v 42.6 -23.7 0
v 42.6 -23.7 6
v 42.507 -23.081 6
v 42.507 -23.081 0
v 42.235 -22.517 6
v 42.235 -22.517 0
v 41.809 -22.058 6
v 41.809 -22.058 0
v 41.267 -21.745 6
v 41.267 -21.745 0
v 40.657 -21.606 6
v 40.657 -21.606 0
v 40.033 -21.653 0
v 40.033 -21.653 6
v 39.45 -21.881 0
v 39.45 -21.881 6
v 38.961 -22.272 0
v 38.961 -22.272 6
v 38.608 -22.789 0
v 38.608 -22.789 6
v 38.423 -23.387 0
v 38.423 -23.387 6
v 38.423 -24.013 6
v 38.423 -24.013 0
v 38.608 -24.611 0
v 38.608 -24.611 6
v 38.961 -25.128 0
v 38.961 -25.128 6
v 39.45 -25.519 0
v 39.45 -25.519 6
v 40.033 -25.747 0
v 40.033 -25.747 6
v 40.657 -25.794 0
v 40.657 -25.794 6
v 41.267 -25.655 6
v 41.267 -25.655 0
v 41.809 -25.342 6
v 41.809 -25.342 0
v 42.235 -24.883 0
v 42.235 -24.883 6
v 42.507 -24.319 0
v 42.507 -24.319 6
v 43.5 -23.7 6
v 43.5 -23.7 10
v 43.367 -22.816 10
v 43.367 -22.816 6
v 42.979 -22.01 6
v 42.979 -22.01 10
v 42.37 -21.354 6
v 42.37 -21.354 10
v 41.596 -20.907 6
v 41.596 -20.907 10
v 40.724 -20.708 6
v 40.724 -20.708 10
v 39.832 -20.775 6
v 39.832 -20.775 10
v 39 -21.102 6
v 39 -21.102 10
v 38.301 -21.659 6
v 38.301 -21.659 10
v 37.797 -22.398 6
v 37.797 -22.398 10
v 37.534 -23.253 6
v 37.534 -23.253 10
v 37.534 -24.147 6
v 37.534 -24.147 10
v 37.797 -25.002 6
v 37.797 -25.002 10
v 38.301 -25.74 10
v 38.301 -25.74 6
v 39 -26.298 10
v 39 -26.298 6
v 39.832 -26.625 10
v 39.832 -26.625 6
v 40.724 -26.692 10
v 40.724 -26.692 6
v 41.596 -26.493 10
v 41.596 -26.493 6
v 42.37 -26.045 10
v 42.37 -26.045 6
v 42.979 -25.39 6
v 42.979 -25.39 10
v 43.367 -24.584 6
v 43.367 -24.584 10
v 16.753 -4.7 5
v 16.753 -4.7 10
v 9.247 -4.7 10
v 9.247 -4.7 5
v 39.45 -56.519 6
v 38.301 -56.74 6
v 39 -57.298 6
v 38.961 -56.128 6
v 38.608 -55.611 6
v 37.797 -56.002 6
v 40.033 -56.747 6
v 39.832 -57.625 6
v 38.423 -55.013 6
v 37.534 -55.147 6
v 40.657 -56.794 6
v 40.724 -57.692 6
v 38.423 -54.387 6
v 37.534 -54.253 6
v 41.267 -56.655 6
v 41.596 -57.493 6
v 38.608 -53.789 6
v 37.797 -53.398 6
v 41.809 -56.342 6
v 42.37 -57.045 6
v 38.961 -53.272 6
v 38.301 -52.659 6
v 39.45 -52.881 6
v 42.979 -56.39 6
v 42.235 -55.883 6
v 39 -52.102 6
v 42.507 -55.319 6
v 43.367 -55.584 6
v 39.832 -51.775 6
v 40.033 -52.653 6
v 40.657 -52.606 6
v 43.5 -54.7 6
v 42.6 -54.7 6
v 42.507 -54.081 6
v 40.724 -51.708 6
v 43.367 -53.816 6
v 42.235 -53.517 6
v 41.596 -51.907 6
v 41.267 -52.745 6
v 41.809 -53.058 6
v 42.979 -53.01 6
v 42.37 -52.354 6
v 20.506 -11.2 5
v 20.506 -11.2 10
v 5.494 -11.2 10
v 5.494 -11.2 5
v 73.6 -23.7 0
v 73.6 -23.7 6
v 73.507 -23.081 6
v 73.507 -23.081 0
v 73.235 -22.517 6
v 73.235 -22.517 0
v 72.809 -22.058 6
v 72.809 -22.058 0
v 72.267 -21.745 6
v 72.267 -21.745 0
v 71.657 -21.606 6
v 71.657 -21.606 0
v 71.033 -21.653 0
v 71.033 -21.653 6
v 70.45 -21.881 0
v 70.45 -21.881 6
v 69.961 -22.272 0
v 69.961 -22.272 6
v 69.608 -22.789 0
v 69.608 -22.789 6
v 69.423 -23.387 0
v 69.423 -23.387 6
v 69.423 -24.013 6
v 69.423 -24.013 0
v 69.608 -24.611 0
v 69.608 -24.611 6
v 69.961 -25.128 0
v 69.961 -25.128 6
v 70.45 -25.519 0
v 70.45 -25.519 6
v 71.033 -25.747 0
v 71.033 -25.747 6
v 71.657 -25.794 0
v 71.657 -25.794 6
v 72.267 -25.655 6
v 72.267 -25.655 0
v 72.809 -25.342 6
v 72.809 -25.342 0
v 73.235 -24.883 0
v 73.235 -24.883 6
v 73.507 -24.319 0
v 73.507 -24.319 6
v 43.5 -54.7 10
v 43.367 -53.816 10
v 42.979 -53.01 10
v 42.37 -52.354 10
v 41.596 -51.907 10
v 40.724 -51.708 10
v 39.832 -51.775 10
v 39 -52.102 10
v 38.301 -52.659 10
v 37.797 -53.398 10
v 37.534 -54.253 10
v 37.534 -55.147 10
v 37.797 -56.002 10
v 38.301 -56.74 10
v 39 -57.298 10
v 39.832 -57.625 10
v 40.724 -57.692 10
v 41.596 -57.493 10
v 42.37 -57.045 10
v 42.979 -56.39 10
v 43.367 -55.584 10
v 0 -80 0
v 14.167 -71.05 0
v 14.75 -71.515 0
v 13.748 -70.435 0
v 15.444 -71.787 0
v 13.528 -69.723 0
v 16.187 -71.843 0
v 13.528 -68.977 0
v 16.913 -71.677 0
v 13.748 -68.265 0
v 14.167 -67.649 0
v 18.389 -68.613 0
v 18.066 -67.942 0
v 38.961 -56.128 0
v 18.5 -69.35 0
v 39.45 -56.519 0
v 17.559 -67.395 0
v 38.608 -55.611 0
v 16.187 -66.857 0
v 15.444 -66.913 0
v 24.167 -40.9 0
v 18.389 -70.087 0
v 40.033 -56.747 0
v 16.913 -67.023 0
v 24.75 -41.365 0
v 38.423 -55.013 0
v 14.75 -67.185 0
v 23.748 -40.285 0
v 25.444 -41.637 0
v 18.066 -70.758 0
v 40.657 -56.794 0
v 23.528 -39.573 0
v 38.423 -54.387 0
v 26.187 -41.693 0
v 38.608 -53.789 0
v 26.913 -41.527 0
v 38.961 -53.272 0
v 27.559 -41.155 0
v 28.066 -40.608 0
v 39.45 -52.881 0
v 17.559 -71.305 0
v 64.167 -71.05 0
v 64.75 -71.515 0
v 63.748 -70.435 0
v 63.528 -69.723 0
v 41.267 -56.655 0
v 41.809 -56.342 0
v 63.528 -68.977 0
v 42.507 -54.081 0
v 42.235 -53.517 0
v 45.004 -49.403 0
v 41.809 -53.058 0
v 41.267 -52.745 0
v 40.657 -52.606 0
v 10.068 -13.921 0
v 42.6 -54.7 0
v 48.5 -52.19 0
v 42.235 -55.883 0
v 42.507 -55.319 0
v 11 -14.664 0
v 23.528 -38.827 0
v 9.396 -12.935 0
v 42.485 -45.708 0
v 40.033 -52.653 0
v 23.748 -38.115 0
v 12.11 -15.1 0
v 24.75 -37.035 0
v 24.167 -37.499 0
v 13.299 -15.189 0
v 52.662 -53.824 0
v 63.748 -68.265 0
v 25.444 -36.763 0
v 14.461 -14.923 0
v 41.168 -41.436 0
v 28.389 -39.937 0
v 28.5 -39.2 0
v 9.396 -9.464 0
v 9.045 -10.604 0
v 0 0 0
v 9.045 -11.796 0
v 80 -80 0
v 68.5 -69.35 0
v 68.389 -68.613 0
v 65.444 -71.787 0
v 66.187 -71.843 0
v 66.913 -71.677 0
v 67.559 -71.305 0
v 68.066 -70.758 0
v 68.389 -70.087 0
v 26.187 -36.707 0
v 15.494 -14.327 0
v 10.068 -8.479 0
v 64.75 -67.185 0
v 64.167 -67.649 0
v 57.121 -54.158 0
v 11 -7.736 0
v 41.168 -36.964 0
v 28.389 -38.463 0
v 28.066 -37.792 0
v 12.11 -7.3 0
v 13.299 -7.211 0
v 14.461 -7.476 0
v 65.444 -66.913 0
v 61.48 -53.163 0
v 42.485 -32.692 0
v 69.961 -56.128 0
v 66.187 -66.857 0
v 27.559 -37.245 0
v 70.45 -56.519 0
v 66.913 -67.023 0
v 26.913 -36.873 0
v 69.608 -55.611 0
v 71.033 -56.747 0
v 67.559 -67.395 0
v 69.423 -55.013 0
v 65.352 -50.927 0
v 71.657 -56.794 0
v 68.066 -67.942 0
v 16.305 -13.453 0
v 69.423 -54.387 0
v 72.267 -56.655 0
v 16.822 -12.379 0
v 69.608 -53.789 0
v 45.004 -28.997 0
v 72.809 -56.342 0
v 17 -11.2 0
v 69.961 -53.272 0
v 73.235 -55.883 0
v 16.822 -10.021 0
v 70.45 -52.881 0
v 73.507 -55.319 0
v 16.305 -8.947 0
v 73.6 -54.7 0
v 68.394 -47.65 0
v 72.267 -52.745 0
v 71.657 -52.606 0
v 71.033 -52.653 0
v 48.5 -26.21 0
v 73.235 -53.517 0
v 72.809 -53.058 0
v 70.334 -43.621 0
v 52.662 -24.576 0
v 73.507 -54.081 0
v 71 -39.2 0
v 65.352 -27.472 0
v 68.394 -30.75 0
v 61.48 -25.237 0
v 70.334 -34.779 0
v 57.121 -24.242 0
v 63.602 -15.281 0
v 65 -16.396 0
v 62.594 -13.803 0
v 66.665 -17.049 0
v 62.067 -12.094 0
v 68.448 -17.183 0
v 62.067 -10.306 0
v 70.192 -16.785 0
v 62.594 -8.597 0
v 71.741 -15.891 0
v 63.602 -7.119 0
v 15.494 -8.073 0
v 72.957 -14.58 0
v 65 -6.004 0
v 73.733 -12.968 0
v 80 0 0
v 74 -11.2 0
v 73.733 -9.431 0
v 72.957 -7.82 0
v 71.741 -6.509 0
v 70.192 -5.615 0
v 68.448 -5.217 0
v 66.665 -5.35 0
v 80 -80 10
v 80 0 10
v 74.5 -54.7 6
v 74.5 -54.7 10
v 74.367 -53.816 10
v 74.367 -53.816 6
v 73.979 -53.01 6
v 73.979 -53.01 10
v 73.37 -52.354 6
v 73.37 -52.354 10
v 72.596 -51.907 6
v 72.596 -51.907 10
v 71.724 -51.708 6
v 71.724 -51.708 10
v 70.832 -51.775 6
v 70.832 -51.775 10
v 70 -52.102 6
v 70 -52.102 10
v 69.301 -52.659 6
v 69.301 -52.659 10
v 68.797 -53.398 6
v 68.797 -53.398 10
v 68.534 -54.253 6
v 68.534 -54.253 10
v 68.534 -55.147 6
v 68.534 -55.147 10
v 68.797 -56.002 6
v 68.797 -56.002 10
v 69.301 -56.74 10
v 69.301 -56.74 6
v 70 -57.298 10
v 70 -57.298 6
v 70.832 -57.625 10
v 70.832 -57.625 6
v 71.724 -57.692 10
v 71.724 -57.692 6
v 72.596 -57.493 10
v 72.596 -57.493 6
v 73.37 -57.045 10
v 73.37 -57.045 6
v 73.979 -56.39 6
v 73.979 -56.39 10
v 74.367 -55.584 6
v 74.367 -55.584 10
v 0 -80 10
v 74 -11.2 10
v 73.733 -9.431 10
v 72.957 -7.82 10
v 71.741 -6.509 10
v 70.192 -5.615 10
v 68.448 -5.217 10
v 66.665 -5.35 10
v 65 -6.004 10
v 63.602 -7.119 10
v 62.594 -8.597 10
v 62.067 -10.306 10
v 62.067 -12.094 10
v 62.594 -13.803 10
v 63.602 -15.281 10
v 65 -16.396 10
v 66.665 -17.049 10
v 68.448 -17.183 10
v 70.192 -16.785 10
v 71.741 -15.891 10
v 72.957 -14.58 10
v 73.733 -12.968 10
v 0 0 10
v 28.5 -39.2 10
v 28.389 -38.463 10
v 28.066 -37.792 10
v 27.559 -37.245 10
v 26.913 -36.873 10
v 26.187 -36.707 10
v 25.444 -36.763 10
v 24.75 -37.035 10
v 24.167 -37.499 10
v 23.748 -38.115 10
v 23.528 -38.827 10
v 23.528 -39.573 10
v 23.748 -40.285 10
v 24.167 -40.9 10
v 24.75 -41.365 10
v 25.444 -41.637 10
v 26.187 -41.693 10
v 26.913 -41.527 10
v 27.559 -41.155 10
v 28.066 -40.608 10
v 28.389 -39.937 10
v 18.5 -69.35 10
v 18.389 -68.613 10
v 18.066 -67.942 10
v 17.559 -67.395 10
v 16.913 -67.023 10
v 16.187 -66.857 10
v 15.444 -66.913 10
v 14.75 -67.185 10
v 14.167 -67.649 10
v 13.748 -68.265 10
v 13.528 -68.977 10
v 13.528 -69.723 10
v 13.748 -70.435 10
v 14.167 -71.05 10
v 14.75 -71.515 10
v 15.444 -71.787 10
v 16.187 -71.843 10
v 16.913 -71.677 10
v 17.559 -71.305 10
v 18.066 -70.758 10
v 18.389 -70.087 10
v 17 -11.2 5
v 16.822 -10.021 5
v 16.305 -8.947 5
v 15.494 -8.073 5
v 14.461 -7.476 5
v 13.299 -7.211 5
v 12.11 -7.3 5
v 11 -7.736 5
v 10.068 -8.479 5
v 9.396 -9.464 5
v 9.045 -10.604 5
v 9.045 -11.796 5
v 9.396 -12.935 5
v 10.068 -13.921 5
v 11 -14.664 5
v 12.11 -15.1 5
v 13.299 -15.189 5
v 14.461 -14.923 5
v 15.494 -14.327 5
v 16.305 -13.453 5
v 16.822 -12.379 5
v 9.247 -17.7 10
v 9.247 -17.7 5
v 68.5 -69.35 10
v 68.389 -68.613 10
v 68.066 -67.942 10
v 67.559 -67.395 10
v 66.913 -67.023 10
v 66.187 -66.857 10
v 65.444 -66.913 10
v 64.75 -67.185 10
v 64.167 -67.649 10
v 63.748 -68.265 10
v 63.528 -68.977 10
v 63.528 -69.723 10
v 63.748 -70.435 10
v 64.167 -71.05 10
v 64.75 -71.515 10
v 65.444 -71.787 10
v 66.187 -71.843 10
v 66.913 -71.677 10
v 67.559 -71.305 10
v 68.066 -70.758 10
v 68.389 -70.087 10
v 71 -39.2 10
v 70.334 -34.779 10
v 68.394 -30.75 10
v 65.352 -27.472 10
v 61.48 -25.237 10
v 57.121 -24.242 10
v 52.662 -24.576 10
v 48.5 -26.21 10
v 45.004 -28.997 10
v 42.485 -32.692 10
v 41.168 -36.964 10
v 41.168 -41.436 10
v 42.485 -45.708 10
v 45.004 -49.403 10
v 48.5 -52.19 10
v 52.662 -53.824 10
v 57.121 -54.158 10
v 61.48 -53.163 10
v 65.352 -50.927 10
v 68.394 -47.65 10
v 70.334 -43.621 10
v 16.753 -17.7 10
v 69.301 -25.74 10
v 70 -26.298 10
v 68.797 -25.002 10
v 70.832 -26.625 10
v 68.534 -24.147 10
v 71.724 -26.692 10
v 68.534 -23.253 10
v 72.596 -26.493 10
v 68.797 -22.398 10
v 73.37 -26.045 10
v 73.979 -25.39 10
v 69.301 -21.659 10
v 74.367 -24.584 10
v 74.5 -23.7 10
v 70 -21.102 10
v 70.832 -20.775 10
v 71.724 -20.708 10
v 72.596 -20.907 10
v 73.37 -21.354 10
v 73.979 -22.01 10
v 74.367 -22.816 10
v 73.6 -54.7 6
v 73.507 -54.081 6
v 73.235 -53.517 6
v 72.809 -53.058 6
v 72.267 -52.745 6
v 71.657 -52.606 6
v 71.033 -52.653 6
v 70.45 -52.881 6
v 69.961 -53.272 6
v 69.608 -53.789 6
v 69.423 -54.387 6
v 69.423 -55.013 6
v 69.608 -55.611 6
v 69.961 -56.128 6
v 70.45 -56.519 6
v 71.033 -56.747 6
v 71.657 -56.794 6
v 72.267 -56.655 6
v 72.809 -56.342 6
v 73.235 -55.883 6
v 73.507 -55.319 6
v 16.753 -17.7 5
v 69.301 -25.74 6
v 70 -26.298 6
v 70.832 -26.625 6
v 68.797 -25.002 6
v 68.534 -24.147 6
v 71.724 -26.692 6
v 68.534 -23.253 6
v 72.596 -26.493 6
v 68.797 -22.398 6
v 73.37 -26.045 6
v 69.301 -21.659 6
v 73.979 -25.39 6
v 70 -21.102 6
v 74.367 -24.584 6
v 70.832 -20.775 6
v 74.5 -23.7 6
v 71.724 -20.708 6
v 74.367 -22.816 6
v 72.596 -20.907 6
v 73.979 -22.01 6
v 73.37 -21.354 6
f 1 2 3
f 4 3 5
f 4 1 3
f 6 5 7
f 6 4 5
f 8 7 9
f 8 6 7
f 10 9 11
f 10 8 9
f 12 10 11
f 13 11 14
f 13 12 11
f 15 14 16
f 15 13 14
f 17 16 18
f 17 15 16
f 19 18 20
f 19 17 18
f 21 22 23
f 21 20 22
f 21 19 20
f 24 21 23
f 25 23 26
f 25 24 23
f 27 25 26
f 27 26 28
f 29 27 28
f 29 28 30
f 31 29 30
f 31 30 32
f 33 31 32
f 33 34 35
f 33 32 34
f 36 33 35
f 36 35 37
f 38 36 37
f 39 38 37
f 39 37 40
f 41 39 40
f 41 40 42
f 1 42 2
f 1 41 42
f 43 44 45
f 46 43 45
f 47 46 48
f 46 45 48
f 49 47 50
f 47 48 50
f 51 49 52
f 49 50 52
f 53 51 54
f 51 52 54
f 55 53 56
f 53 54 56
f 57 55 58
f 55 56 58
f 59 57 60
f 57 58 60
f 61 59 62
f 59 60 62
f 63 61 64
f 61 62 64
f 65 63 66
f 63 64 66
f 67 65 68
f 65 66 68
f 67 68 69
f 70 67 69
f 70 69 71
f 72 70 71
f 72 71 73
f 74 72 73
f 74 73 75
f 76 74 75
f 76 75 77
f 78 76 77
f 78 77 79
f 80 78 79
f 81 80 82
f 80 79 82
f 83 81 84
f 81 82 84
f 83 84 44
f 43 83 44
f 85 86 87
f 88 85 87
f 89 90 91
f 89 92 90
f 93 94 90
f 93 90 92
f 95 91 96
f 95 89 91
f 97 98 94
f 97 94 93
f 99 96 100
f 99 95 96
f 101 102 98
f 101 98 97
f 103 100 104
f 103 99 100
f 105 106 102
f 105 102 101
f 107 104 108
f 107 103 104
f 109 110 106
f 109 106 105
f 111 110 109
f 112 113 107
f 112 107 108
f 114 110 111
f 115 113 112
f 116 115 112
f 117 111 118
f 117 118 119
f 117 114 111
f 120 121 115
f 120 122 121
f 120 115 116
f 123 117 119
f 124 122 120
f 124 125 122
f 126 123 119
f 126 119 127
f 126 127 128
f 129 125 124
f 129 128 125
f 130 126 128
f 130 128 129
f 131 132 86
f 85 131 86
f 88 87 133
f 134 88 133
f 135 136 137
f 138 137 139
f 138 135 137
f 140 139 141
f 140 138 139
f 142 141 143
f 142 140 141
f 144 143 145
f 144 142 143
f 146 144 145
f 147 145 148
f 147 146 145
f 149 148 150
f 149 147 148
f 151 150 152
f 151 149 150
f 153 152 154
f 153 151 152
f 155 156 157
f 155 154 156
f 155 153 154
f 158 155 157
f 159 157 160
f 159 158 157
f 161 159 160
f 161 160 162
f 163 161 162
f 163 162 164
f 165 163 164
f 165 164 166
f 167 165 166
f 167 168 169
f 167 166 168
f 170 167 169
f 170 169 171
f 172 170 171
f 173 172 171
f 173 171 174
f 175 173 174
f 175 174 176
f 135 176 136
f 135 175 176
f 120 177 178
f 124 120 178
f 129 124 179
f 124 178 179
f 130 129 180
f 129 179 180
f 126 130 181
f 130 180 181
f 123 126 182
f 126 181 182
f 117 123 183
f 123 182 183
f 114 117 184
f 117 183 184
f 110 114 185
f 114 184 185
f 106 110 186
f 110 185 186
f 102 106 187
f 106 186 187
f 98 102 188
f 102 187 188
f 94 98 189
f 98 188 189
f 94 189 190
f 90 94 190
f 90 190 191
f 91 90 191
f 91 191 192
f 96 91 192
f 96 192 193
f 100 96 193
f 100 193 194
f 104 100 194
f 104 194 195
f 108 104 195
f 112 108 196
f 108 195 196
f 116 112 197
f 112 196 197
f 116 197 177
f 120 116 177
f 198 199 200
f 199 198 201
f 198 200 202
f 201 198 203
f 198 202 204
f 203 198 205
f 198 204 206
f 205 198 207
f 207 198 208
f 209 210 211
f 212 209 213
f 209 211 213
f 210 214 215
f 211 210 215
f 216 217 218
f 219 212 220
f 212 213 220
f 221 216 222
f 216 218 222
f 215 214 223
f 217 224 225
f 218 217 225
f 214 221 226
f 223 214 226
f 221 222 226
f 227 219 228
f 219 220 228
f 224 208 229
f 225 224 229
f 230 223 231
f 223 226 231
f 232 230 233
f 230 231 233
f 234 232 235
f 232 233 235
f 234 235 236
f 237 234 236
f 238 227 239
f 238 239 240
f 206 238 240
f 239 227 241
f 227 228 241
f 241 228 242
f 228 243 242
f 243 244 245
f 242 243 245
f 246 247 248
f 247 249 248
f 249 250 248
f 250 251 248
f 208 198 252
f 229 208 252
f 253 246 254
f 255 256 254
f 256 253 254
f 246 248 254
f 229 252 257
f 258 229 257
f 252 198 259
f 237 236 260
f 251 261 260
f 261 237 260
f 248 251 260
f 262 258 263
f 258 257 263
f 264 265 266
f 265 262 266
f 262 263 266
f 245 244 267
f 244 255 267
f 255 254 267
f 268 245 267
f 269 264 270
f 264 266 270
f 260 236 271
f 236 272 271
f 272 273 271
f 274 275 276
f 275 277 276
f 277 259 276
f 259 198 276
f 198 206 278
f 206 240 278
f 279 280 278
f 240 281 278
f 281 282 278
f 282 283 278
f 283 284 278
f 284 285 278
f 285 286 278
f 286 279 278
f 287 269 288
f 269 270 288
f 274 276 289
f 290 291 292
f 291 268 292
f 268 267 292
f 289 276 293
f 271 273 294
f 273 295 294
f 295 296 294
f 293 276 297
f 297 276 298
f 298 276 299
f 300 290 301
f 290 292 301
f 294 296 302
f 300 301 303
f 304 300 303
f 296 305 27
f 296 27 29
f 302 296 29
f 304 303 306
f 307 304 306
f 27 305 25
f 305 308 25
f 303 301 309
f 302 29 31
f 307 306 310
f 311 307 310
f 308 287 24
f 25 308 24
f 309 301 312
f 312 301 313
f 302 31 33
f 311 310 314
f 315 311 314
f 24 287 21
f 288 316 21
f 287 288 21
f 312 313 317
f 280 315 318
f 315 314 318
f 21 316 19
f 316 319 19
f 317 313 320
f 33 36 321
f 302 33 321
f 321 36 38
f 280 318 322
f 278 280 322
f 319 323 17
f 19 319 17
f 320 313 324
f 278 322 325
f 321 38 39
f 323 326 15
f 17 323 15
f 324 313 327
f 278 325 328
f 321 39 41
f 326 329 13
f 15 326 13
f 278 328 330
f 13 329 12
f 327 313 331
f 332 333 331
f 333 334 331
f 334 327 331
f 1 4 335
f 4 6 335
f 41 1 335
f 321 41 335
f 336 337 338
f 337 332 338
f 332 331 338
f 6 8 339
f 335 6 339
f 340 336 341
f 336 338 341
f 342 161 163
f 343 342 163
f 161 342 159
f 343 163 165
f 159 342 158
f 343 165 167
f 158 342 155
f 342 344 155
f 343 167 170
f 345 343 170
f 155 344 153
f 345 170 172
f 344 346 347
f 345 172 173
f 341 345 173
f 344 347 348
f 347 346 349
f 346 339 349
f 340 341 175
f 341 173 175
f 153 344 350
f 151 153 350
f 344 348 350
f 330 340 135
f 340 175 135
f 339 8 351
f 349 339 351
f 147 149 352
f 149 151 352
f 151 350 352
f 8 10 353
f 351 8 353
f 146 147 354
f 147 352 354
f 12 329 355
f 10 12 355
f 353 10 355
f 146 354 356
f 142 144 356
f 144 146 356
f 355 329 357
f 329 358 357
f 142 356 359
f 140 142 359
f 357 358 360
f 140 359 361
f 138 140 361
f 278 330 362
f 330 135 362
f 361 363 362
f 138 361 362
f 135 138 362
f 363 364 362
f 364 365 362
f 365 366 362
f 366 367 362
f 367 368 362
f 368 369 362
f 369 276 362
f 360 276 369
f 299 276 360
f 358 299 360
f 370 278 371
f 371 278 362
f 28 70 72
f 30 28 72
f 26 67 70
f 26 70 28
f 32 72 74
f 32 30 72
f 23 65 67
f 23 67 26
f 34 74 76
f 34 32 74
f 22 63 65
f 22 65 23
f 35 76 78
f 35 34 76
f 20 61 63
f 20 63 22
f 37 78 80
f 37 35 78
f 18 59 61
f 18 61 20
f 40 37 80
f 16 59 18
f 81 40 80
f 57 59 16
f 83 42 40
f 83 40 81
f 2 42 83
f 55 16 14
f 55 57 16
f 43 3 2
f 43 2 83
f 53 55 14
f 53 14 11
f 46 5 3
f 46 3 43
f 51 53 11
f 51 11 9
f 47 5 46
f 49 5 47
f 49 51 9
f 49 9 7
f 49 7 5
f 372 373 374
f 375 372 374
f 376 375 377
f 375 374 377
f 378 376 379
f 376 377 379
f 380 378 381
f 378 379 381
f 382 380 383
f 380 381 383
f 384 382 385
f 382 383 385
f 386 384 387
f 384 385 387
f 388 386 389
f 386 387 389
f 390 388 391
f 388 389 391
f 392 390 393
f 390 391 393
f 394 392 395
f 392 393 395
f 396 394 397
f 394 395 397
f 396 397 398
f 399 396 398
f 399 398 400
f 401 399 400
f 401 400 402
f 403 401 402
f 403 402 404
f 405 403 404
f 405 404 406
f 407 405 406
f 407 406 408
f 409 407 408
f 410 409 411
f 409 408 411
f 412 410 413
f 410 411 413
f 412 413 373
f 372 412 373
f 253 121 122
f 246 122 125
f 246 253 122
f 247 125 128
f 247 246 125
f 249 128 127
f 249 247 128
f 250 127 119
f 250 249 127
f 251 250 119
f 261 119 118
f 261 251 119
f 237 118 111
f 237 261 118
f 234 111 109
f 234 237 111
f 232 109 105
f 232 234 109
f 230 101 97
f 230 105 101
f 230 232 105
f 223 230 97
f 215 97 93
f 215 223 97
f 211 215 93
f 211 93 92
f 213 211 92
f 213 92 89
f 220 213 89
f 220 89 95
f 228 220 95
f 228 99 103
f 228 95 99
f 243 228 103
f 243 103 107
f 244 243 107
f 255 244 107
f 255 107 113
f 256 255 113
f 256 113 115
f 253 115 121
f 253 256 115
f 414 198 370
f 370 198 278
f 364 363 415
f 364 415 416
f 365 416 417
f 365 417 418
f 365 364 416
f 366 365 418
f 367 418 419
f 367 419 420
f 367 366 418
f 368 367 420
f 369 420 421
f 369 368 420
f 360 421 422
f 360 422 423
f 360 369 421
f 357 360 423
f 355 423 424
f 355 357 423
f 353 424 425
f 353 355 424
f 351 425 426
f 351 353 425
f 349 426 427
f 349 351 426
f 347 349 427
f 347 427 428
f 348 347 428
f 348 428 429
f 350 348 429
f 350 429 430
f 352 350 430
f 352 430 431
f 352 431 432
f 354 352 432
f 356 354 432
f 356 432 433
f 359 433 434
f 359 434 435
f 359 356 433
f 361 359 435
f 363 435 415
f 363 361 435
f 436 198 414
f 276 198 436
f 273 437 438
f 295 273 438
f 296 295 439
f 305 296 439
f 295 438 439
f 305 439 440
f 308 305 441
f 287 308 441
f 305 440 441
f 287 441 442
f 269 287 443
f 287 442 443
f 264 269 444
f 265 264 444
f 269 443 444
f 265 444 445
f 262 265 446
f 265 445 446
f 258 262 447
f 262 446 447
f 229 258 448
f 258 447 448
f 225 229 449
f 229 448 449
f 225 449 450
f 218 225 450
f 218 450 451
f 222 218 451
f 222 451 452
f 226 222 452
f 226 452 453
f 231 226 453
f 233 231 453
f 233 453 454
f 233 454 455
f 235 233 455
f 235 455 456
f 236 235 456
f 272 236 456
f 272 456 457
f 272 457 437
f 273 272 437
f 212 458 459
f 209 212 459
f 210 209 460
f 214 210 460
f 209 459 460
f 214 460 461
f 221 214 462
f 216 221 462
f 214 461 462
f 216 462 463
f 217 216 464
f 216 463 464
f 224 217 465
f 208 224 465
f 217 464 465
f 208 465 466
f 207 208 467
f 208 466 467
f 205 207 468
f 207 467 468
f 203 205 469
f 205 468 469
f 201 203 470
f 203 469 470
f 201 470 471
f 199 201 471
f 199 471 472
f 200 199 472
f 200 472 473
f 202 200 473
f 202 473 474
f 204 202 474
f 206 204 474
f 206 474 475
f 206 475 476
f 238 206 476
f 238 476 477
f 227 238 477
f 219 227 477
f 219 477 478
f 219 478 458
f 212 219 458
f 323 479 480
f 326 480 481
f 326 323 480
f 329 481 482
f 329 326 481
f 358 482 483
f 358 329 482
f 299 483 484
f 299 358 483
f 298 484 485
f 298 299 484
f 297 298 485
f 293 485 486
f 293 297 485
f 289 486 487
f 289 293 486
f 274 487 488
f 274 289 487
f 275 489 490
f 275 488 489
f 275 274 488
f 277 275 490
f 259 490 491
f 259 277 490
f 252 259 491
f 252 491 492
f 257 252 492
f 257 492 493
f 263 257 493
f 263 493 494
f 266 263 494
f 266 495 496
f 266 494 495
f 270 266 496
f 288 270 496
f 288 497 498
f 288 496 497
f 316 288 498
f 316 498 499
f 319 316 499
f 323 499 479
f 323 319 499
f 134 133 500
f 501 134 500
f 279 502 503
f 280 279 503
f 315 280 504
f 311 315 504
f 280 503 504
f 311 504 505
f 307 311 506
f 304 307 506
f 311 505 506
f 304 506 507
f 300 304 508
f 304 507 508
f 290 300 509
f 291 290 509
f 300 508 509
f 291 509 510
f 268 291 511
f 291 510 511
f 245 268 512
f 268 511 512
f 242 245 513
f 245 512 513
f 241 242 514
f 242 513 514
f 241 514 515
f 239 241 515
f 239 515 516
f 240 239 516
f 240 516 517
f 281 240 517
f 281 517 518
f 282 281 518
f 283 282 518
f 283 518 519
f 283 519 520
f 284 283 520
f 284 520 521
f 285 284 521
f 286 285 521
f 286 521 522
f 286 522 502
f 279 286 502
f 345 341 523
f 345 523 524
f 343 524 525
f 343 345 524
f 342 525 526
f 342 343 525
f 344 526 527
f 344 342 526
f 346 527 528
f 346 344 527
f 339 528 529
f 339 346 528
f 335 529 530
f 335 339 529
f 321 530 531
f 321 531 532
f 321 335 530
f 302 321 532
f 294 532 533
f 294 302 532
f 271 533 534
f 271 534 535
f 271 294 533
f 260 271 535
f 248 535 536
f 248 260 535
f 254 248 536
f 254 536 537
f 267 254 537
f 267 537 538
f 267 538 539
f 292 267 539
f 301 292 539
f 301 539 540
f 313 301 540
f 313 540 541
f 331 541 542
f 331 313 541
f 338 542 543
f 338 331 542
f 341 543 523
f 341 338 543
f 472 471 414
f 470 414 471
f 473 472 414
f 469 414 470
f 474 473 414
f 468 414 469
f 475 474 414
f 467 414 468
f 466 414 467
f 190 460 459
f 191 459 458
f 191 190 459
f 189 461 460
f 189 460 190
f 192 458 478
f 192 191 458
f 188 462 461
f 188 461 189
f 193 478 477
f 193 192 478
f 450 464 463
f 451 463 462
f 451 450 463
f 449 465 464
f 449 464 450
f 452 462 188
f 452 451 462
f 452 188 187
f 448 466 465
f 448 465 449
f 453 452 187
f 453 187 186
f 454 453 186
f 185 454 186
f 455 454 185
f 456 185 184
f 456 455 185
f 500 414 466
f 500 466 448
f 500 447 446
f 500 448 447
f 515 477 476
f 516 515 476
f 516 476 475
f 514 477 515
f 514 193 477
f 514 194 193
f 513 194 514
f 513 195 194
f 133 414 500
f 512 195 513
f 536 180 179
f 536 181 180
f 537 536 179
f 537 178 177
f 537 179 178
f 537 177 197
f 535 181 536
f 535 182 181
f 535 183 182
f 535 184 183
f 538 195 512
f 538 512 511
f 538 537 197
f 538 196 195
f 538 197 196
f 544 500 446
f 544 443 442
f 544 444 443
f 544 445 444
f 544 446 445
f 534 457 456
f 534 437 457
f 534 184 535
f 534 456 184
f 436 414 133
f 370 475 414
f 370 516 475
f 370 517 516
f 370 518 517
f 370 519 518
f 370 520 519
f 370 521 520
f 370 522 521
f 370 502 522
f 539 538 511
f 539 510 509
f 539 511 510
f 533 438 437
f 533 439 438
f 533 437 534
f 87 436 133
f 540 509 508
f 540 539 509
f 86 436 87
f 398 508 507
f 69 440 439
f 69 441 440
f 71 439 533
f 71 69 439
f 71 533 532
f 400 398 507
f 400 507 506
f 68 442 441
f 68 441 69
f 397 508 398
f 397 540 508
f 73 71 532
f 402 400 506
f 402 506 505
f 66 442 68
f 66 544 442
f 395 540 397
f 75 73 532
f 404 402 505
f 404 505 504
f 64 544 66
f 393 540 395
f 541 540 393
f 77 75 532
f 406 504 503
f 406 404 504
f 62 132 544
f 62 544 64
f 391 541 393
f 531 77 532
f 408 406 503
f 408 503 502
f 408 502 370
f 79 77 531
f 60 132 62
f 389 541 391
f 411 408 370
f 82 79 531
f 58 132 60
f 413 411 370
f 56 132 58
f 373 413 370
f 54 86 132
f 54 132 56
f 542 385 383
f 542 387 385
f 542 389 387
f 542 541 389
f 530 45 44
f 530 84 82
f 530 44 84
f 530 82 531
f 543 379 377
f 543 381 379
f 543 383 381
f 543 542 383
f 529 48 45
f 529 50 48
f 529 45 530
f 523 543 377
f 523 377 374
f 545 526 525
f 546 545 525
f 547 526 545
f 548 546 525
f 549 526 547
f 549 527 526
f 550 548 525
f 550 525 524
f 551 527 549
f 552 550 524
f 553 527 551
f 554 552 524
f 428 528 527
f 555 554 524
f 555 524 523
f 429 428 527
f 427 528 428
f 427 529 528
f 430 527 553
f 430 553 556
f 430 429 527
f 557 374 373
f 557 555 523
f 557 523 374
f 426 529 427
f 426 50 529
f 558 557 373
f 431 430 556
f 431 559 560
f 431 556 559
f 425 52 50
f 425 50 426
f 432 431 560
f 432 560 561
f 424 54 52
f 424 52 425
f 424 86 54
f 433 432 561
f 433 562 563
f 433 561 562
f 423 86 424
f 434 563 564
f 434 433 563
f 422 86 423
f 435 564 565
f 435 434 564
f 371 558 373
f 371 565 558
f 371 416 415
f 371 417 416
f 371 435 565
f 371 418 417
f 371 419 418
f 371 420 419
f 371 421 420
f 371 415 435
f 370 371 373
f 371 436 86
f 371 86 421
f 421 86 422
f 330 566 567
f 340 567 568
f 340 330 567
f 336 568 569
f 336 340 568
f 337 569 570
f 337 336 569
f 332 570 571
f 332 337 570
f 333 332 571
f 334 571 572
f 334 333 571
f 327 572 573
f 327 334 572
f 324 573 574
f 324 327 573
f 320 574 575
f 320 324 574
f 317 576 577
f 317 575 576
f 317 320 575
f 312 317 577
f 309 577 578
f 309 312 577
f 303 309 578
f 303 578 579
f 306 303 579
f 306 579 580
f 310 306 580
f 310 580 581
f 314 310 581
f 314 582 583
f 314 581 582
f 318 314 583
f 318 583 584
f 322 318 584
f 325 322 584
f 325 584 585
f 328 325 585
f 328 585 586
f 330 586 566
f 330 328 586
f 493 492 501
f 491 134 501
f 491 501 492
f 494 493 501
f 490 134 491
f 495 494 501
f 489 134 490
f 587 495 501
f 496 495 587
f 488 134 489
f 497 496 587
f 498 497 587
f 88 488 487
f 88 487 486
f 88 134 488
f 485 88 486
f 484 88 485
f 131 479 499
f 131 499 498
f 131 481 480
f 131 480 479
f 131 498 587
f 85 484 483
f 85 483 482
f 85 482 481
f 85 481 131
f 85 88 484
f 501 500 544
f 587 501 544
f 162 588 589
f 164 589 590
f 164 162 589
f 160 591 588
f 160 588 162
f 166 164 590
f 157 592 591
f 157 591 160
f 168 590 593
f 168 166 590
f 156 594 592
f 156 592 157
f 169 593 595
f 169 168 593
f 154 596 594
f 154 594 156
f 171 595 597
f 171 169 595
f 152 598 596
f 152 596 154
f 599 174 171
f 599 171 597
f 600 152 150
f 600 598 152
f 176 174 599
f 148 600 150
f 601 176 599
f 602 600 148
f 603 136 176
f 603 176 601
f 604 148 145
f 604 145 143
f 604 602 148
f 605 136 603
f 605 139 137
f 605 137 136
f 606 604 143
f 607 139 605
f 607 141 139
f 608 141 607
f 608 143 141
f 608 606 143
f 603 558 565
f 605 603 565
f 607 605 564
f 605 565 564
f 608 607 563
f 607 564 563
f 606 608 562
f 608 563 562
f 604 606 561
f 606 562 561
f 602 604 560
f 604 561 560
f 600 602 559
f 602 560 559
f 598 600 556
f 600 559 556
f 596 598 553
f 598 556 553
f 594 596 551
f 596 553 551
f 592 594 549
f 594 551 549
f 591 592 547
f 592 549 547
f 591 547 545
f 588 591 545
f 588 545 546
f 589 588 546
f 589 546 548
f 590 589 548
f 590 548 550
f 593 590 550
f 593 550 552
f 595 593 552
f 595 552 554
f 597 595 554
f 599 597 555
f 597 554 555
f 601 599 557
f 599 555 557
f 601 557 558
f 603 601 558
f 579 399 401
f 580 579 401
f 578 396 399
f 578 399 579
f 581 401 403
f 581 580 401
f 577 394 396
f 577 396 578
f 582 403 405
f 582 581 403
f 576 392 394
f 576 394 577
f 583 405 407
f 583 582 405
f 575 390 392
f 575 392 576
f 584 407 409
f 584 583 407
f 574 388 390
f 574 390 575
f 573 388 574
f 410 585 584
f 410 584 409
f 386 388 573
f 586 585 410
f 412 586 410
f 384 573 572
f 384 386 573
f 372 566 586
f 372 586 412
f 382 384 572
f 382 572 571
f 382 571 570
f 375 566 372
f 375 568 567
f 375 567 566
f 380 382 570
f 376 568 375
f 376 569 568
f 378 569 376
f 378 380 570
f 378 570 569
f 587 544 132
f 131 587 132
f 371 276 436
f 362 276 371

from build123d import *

# Parameters (mm, degrees)
F0_W     = 80
F0_H     = 80
F0_R     = 2.1
F0_R_2   = 4
F0_R_3   = 15
F0_R_4   = 6
F1_DEPTH = 10
F2_R     = 2.5
F3_DEPTH = 25
F4_R     = 3
F5_DEPTH = 4
F7_DEPTH = 5


with BuildPart() as f1:
    # F0 (on Top) → F1 (new body)
    with BuildSketch(Plane.XY):
        with Locations((40, -40)):
            Rectangle(F0_W, F0_H)
        with Locations((40.5, -54.699928)):
            Circle(F0_R, mode=Mode.SUBTRACT)
        with Locations((71.5, -54.699928)):
            Circle(F0_R, mode=Mode.SUBTRACT)
        with Locations((13, -11.199928)):
            Circle(F0_R_2, mode=Mode.SUBTRACT)
        with Locations((56, -39.199928)):
            Circle(F0_R_3, mode=Mode.SUBTRACT)
        with Locations((40.5, -23.699928)):
            Circle(F0_R, mode=Mode.SUBTRACT)
        with Locations((71.5, -23.699928)):
            Circle(F0_R, mode=Mode.SUBTRACT)
        with Locations((68, -11.199928)):
            Circle(F0_R_4, mode=Mode.SUBTRACT)
    extrude(amount=F1_DEPTH)

    # F2 (on face) → F3 (cut)
    with BuildSketch(Plane.XY.offset(10)):
        with Locations((26, -39.199928)):
            Circle(F2_R)
        with Locations((16, -69.349928)):
            Circle(F2_R)
        with Locations((66, -69.349928)):
            Circle(F2_R)
    extrude(amount=-F3_DEPTH, mode=Mode.SUBTRACT)

    # F4 (on face) → F5 (cut)
    with BuildSketch(Plane.XY.offset(10)):
        with Locations((40.5, -23.699928)):
            Circle(F4_R)
        with Locations((71.5, -23.699928)):
            Circle(F4_R)
        with Locations((40.5, -54.699928)):
            Circle(F4_R)
        with Locations((71.5, -54.699928)):
            Circle(F4_R)
    extrude(amount=-F5_DEPTH, mode=Mode.SUBTRACT)

    # F6 (on face) → F7 (cut)
    with BuildSketch(Plane.XY.offset(10)):
        Polygon((16.752777, -4.699928), (9.247223, -4.699928), (5.494447, -11.199928), (9.247223, -17.699928), (16.752777, -17.699928), (20.505553, -11.199928), align=None)
    extrude(amount=-F7_DEPTH, mode=Mode.SUBTRACT)


solid = f1.part
